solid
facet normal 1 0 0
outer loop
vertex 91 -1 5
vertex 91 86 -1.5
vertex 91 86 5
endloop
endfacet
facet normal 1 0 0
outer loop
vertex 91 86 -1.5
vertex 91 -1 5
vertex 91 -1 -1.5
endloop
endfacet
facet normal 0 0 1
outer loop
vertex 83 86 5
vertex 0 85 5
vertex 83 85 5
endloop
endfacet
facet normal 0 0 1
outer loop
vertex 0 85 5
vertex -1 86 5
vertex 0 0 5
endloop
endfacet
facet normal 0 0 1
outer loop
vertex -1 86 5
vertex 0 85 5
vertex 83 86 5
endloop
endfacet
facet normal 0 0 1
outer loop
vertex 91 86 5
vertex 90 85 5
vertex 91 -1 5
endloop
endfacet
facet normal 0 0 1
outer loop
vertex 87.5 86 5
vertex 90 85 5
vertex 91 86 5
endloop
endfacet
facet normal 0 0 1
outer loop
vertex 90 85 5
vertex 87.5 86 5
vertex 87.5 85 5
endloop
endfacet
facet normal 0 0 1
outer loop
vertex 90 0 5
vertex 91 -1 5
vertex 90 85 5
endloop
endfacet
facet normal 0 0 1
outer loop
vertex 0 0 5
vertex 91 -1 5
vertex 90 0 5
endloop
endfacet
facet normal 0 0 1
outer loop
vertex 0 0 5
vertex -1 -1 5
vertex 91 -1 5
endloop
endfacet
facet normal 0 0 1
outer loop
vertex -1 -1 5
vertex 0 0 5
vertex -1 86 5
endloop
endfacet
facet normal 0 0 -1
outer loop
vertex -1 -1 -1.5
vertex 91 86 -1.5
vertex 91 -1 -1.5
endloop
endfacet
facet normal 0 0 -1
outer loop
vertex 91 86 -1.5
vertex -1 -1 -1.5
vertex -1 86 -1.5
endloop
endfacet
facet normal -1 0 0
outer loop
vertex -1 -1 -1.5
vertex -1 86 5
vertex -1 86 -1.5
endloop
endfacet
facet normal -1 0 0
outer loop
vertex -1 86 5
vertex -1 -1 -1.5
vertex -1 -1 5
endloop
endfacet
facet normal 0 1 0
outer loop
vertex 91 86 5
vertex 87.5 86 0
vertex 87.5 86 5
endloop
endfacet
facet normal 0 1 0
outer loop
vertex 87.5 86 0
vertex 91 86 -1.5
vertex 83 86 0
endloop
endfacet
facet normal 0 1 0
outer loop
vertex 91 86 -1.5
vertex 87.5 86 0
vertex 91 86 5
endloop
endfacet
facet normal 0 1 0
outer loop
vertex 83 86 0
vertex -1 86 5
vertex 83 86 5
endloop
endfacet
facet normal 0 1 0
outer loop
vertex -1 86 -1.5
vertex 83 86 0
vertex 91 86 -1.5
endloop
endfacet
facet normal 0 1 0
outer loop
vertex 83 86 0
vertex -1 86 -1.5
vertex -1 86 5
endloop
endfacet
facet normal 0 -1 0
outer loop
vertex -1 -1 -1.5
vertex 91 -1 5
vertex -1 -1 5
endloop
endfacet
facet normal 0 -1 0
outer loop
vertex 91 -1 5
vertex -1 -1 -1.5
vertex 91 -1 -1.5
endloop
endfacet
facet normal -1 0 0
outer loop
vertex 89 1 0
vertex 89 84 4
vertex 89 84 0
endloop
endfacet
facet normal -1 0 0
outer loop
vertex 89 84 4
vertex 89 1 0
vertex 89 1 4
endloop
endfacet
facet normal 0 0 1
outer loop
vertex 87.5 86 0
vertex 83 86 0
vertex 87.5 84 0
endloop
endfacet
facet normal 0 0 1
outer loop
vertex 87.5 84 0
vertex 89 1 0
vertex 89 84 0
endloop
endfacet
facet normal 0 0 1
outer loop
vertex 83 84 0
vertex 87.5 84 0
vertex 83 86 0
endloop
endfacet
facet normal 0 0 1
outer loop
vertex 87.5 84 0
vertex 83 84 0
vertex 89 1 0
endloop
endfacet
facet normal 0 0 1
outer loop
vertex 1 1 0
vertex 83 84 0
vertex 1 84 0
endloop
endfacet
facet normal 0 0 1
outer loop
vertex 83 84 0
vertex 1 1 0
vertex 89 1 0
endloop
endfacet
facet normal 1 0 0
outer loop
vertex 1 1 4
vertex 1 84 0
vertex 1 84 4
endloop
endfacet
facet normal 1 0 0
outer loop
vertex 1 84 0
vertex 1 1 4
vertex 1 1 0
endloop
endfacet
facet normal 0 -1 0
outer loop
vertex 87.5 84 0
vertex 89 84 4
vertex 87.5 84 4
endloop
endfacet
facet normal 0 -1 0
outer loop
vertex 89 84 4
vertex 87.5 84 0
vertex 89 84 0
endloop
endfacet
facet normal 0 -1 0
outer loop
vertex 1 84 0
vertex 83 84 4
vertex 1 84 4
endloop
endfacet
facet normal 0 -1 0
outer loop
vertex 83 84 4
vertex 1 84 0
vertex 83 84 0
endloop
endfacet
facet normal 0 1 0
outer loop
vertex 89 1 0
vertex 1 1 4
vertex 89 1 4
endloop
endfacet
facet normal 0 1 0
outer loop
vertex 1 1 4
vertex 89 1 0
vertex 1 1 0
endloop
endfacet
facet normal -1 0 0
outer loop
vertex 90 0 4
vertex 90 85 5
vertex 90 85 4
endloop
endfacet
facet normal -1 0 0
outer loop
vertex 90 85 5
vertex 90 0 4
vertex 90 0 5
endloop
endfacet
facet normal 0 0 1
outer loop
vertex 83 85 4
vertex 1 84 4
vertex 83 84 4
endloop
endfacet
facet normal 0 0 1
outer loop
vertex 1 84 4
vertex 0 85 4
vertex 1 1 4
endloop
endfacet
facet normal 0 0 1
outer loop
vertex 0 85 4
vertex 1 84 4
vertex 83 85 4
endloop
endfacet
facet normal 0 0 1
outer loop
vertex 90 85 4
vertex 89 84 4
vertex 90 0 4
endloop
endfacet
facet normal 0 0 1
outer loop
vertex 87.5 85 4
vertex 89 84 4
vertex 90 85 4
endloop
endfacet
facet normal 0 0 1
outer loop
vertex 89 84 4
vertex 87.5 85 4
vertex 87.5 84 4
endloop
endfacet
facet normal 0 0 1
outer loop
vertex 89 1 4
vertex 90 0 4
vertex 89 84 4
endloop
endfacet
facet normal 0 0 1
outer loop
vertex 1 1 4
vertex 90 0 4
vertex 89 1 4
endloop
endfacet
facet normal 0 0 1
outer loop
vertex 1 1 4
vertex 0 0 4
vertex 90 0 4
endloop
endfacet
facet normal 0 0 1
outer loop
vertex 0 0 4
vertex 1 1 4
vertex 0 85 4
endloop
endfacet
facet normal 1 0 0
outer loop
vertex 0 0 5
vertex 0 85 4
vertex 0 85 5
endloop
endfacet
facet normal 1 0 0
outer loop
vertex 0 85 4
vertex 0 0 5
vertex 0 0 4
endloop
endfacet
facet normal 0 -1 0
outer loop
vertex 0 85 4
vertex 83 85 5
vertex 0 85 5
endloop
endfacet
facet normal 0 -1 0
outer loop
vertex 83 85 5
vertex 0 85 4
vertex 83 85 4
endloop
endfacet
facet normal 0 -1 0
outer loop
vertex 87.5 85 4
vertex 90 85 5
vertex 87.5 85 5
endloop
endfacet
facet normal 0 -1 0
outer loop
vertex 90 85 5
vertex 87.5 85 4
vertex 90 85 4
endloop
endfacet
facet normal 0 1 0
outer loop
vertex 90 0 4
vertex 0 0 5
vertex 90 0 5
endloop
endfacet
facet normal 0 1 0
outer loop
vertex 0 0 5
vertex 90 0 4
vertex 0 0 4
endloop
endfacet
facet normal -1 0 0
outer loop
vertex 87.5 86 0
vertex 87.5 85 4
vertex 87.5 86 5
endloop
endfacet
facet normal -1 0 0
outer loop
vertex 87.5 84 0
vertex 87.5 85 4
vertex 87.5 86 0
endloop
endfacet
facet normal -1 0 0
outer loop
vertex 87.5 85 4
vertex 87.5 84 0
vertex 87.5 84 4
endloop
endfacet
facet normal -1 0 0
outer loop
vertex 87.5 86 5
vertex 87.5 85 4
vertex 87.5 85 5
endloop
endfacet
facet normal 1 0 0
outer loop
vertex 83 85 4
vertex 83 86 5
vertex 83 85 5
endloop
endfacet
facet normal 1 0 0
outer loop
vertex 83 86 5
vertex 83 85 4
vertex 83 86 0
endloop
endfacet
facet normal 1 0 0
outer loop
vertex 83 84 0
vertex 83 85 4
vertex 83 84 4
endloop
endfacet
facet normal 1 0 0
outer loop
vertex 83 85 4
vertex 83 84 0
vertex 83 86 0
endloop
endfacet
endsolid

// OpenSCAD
// 1cm to 1foot scale model of the IBM Q System One Quantum Computer

// Andy Stanford-Clark
// andysc@uk.ibm.com / @andysc
// Feb '19


// v4.5 is a tidy-up for publication
// v4 is the redesigned glass idea for the base and lid
// v3 adds the deltas for the exploded view



// print list...

// 1. base 
// 2. base_lid 
// 3. back_box  * print with raft *
// 4. top_box * print with 1mm brim *
//    (then trim off all *except* the hole where the diffuser goes, as we need the lip to sit the diffuser on)
// 5. top_box_lid (inverted) 
// 6. lid (inverted)
// 7. lid_lower (inverted)
// 8. lid plinth (inverted for smoothness)

// 9. reflector in white (inverted)
// 10. reflector_strip in white

// 11. diffuser in clear filament (inverted) 

// cryostat needs to be a 25mm x 44mm silver tube (I used chrome-plated wardrobe rail)

// glass walls in 1mm acrylic
// front and back: 92 x 81 mm
// left and right: 85 x 81 mm

// --------------------------------------------------------------------------------
// these should be the only bits you need to change (down to next dashed line)

// which bits to print?
// set each of these true in turn, and all the others false, to make each component


base = true;
base_lid = false;
back_box = false;
top_box = false;
top_box_lid = false;

// translucent
diffuser = false;

// white
reflector = false;
reflector_strip = false;

lid = false;
lid_lower = false; // the "lid" of the lid, if you like!
lid_plinth = false; // the thin plate on the very very top of the system


// --------------------------------------------------------------------------------
// optional elements for display purposes

cryostat = false; // we're not going to print this - it's just for display

// master control for walls
walls = false;
// selectively remove some of the walls
left_wall=true;
right_wall=false;
front_wall=false;
back_wall=true;


explode = 0; // set to 1 to explode the view, 0 normally

// --------------------------------------


wiring = true; // put in the cut-outs for a micro-USB cable
// how much extra height do we need on the base to allow for the cable?
extra_base = 1.5;


d = 3;
d1 = explode * d;     // base lid
d2 = explode * d*2; // back box
d3 = explode * d*5; // top box
d4 = explode * d*6.2; // lid lower
d5 = explode * d*7; // lid
d6 = explode * d*7.5; // lid plinth
d7 = explode * d*3; // diffuser 
d8 = explode * d*6; // top box lid
d9 = explode * d*2; // walls
d10 = explode * d*2; // cryostat


black = "white"; 
//black = "black";
white = "red";
//white = "white";

// going with a scale of 1cm to 1ft, so as it's 9ft wide, it's 90mm wide
// this is the INSIDE measurement - the flange for the glass is outside this
width = 90;
height = 90;
depth = 85;



mink_radius = 3;

// things that fit inside each other (e.g. diffuser inside top box)
// i.e. 0.5 mm total if you allow this each side (i.e. 2*)
tolerance = 0.25;

base_height = 6;
// make the back box a little bit lower just to allow for joint tolerances and stuff
back_box_height = 65 - 1; // this should be 65
back_box_depth = 37;   

top_box_height = 10;
// how far inset is the top box?
inside_gap = 3;

cryostat_height = 43;
cryostat_diameter = 25;

lid_height = 5;
// size of hole for wire in top box
wire_hole = 5;

// how thick to make the internal box walls
box_walls = 1.5;

// how thick is the half inch thick plate glass?
glass_thickness = 1;

// how thin to make the little outside lip of the base?
edge_delta = 0.5;
 
 
 
// here we go....  

back_box_width = width - 2*inside_gap;

color(black) {
    
// base
if (base) {
    difference() {
        translate([-glass_thickness, -glass_thickness, -extra_base])
            cube([width + 2*glass_thickness, depth + 2*glass_thickness, 
            base_height-1+extra_base]);
        // hollow out the insides
        translate([1, 1,-extra_base+box_walls])
            cube([width - 2, depth - 2, base_height-box_walls-1+extra_base]);
        // make a lip 1mm down for the lid to rest on
        translate([0, 0, base_height-1-1])
            cube([width, depth, 1]);
        
        // make the hole for the cable to come in
        if (wiring)
            translate([width - 7, depth -1, box_walls-extra_base])
                #cube([4.5,1+glass_thickness,base_height-box_walls-1+extra_base]);
        
    }  
}


// base lid
if (base_lid) {    
        difference() {
            union() {
                // lid panel
                translate([0,0,base_height-1-1 + d1])
                    cube([width-2*tolerance, depth-2*tolerance, 2]);
        
                // make a stub for the back box to sit over
                translate([inside_gap+mink_radius, inside_gap + (25+15) + mink_radius, base_height])
                // 1.5 * tolerance cos that's half of 3
                   translate([box_walls+1.5*tolerance, box_walls+1.5*tolerance, 0])
                        difference() {
                            minkowski() {
                                // make it 3*tolerance for a bit of extra wiggle room
                                cube([back_box_width-2*mink_radius - 2*box_walls - 3*tolerance, 
                                    back_box_depth-2*mink_radius - 2*box_walls - 3*tolerance, 
                                    2]);
                                // where '2' is the height of the stub
                                cylinder(r=mink_radius, h=0.0001, $fn=100);
                            }
                            // hollow out the inside
                            translate([box_walls, box_walls, 0])
                                minkowski() {
                                    cube([back_box_width-2*mink_radius - 2*box_walls - 2*tolerance - 2*box_walls, 
                                        back_box_depth-2*mink_radius - 2*box_walls - 2*tolerance - 2*box_walls, 
                                        2]);
                                    // where '2' is the height of the stub
                                    cylinder(r=mink_radius, h=0.0001, $fn=100);
                                }
                       } // difference
                   } // union
                   
        // make the hole for a cable to come in
        if (wiring) {
            // hole right through the base for micro USB plug to go through
            translate([inside_gap+mink_radius + back_box_width - 15, 
                        inside_gap + (25+15) + mink_radius + back_box_depth - 15,
                        0]) 
                cylinder(d=15, h=base_height, $fn=100);
 
        } // wiring
        
    }  // difference
}
    

// back box
if (back_box) {

  translate([inside_gap+mink_radius, inside_gap + 25+15 + mink_radius, base_height + d2]) {
 
    difference() {
        minkowski() {
            cube([back_box_width-2*mink_radius, back_box_depth-2*mink_radius, back_box_height]);
            cylinder(r=mink_radius, h=0.0001, $fn=100);
        }
        translate([box_walls, box_walls, 0])
            minkowski() {
                cube([back_box_width-2*mink_radius - 2*box_walls, 
                    back_box_depth-2*mink_radius - 2*box_walls, 
                    back_box_height+0.1]);
                cylinder(r=mink_radius, h=0.0001, $fn=100);
        }
    }
    
    // add a little lip for the top box to register onto
    translate([box_walls,back_box_depth - 2*mink_radius - wire_hole - box_walls,
        back_box_height - 5])
        difference() {    
            minkowski() {
                cube([width - 2*inside_gap - 2*mink_radius - 2*box_walls, 
                        wire_hole,
                    box_walls + 5]);
                cylinder(r=mink_radius, h=0.0001, $fn=100);
            }
            // take out the "inside"
                translate([box_walls,-box_walls,0])
                minkowski() {
                    cube([width - 2*inside_gap - 2*mink_radius - 2* 2*box_walls, 
                            wire_hole,
                        box_walls + 5]);
                    cylinder(r=mink_radius, h=0.0001, $fn=100);
                }
        // don't cut out a block the size of the minkowski radius added on top and bottom, 
        // so the hole is actually wire_holes mm across    
        translate([-mink_radius,-mink_radius,0])
            cube([width - 2*inside_gap - 0*2*mink_radius - 2*box_walls, 
            2*mink_radius + tolerance, box_walls + 5+0.1]);
        }
    }

}

// top box
if (top_box) {
translate([inside_gap+mink_radius, inside_gap + mink_radius, base_height + back_box_height + d3])
    difference() {
        minkowski() {
            cube([width - 2*inside_gap - 2*mink_radius, 77 - 2*mink_radius,              top_box_height - box_walls]);
            cylinder(r=mink_radius, h=0.0001, $fn=100);
        }
        // hollow out the inside
        translate([box_walls, box_walls, box_walls]) {
            minkowski() {
                cube([width - 2*inside_gap - 2*mink_radius - 2*box_walls, 
                        77 - 2*mink_radius - 2*box_walls,
                    top_box_height+0.1]);
                cylinder(r=mink_radius, h=0.0001, $fn=100);
            }
            
            // hole for the diffuser
            translate([0,0,-box_walls])
                minkowski() {
                    cube([width - 2*inside_gap - 2*mink_radius - 2*box_walls, 
                            5/8* 77 - 2*mink_radius - 2*box_walls,
                        top_box_height+0.1]);
                    cylinder(r=mink_radius, h=0.0001, $fn=100);
                }
             
            // a hole for the wires
            translate([0,77 - 2*mink_radius - 2*box_walls - wire_hole,-box_walls])         
                difference() {    
                    minkowski() {
                        cube([width - 2*inside_gap - 2*mink_radius - 2*box_walls, 
                                wire_hole,
                            box_walls+0.1]);
                        cylinder(r=mink_radius, h=0.0001, $fn=100);
                    }
                    // leave a block the size of the minkowski radius added on top and bottom, 
                    // so the hole is actually wire_holes mm across    
                    translate([-mink_radius,-mink_radius,0])
                        cube([width - 2*inside_gap - 2*box_walls, 
                        2*mink_radius, box_walls]);
            }
        }
    }
}


if (top_box_lid)
    translate([inside_gap+mink_radius, inside_gap + mink_radius, base_height + back_box_height+top_box_height - box_walls + d8]) {
         minkowski() {
            cube([width - 2*inside_gap - 2*mink_radius, 77 - 2*mink_radius,              box_walls]);
            cylinder(r=mink_radius, h=0.0001, $fn=100);
        }      
        translate([box_walls+tolerance, box_walls+tolerance, -box_walls/2]) {
        minkowski() {
            cube([width - 2*inside_gap - 2*mink_radius - 2*box_walls - 2*tolerance, 
                    77 - 2*mink_radius - 2*box_walls - 2*tolerance,
                box_walls/2]);
            cylinder(r=mink_radius, h=0.0001, $fn=100);
        }   
    }
}


// lid
if (lid) {
    
    translate([0,0, height - lid_height + 1 + d5]) 
    
    difference() {
        translate([-glass_thickness, -glass_thickness, 0])
            cube([width + 2*glass_thickness, depth + 2*glass_thickness, lid_height-1]);
        // remove the insides
        translate([1, 1, 0])
            cube([width - 2, depth - 2, lid_height - 1 - box_walls]);
        // make a lip 1mm down for the lid to rest on
        translate([0, 0, 0])
            cube([width, depth, 1]);
    }
}


// lid lower
if (lid_lower) {
    translate([tolerance,tolerance,height - lid_height + d4]) 
        cube([width - 2*tolerance, depth - 2*tolerance, 1 + 1]);
}


// lid plinth
// the thin plate on top of the lid (which is hard to print in place)
if (lid_plinth)
    translate([0,0,height - lid_height + d6]) 
       translate([inside_gap/2, inside_gap/2, lid_height])
            cube([width - inside_gap, depth - inside_gap, 1]);
    

} // end of black



color(white) {
    // reflector
    if (reflector)
        translate([inside_gap+ mink_radius, 
                inside_gap, 
                base_height + back_box_height + top_box_height - box_walls - box_walls/2+0*15]) {
         
            translate([box_walls+tolerance, box_walls+tolerance, -0.5]) {
                          
                cube([width - 2*inside_gap - 2*box_walls - 2*tolerance - mink_radius*2, 
                        77 - 2*box_walls - 2*tolerance -5,
                    0.5]);
                
                difference() {
                               
                translate([0,0,- (top_box_height - box_walls/2 - 2*box_walls) + box_walls/2])
                    cube([width - 2*inside_gap - 2*box_walls - 2*tolerance - mink_radius*2,
                           5.5/8* 77 - 2*mink_radius - 2*box_walls - 2*tolerance,
                            top_box_height - box_walls/2 - 2*box_walls - box_walls/2]);
                               
                translate([0.5, 0, -(top_box_height - box_walls/2 - 2*box_walls)])
                  rotate([-7,0,180])
                    translate([-(width - 2*inside_gap - 2*box_walls - 2*tolerance - mink_radius*2),
                            -(5.5/8* 77 - 2*mink_radius - 2*box_walls - 2*tolerance)-0.5,-6-0.3])
                       cube([width - 2*inside_gap - 2*box_walls - 2*tolerance - mink_radius*2 + 1,
                           5.5/8* 77 - 2*mink_radius - 2*box_walls - 2*tolerance + 1,
                            top_box_height - box_walls/2 - 2*box_walls +1]);
                }
                    
        }
    }


    // reflector strip
    // small rectangle of white for the bottom of the top_box
    if (reflector_strip) 
       translate([inside_gap+ mink_radius, inside_gap + 0*mink_radius, base_height + back_box_height+0*top_box_height - box_walls+5]) 
            translate([0, 5/8* 77 - 0*2*mink_radius - 2*box_walls, 0]) {
         
            translate([box_walls+tolerance, box_walls+tolerance, -0.5]) {
     
                cube([width - 2*inside_gap - 2*box_walls - 2*tolerance - mink_radius*2, 
                        3/8* 77 - 2*box_walls - 2*tolerance -3 ,
                    0.5]);
                    
        }
    }

}


 // diffuser
 if (diffuser) {
    color(white) {
    difference() {
        
        translate([inside_gap+mink_radius+box_walls+tolerance, 
                inside_gap + mink_radius + box_walls+tolerance, 
                base_height + back_box_height + d7]) {
            minkowski() {
            cube([width - 2*inside_gap - 2*mink_radius - 2*box_walls - 2*tolerance, 
                    5/8* 77 - 2*mink_radius - 2*box_walls - 2*tolerance,
                    box_walls*1 + 0*1.5]);
                // add 1.5mm to see if it diffuses better
             cylinder(r=mink_radius, h=0.0001, $fn=100);
            }
        }
        // make a little hole for the cryostat to sit in
        translate([width/2, inside_gap + 7.5 + cryostat_diameter/2, 
            base_height + back_box_height + d7])
            cylinder(d=cryostat_diameter+ 2*tolerance, h=box_walls/2, $fn=200);
    }  
    // make a little mound for the chrome tube to sit over
    translate([width/2, inside_gap + 7.5 + cryostat_diameter/2, 
            base_height + back_box_height - 5 + box_walls + d7])
            cylinder(d=cryostat_diameter - 1 - 2*tolerance, h=5, $fn=200);
            // where "1" is 2 x the wall thickness of the chrome tube
            // and where "5" (in the translate and the cylinder) are the height of the mound
  }
}

    

// cryostat - this is just for show
if (cryostat) 
    color("white")
        translate([width/2, inside_gap + 7.5 + cryostat_diameter/2, 
            base_height + back_box_height - cryostat_height + d10])
            cylinder(d=cryostat_diameter, h=cryostat_height, $fn=200);


// walls - just for show
if (walls) 
    translate([0,0,d9])
    color("blue") {
        echo("front/back", width + 2*glass_thickness, height-base_height - lid_height + 2);
        echo("left/right", depth, height-base_height - lid_height + 2);
        
        // front
        if (front_wall)
        translate([-glass_thickness, -glass_thickness - d9, base_height - 1])
            #cube([width + 2*glass_thickness, glass_thickness, 
                height-base_height - lid_height + 2]);
        // back
        if (back_wall)
        translate([-glass_thickness, depth + d9, base_height - 1])
            #cube([width + 2*glass_thickness, glass_thickness, 
                height-base_height - lid_height + 2]);
        // left
        if (left_wall)
        translate([-glass_thickness - d9, 0, base_height-1])
            #cube([glass_thickness, depth, 
                height-base_height - lid_height + 2]);
        // right
        if (right_wall)
        translate([width + d9, 0, base_height-1])
            #cube([glass_thickness, depth, 
                height-base_height - lid_height + 2]);
            
    }

// END
